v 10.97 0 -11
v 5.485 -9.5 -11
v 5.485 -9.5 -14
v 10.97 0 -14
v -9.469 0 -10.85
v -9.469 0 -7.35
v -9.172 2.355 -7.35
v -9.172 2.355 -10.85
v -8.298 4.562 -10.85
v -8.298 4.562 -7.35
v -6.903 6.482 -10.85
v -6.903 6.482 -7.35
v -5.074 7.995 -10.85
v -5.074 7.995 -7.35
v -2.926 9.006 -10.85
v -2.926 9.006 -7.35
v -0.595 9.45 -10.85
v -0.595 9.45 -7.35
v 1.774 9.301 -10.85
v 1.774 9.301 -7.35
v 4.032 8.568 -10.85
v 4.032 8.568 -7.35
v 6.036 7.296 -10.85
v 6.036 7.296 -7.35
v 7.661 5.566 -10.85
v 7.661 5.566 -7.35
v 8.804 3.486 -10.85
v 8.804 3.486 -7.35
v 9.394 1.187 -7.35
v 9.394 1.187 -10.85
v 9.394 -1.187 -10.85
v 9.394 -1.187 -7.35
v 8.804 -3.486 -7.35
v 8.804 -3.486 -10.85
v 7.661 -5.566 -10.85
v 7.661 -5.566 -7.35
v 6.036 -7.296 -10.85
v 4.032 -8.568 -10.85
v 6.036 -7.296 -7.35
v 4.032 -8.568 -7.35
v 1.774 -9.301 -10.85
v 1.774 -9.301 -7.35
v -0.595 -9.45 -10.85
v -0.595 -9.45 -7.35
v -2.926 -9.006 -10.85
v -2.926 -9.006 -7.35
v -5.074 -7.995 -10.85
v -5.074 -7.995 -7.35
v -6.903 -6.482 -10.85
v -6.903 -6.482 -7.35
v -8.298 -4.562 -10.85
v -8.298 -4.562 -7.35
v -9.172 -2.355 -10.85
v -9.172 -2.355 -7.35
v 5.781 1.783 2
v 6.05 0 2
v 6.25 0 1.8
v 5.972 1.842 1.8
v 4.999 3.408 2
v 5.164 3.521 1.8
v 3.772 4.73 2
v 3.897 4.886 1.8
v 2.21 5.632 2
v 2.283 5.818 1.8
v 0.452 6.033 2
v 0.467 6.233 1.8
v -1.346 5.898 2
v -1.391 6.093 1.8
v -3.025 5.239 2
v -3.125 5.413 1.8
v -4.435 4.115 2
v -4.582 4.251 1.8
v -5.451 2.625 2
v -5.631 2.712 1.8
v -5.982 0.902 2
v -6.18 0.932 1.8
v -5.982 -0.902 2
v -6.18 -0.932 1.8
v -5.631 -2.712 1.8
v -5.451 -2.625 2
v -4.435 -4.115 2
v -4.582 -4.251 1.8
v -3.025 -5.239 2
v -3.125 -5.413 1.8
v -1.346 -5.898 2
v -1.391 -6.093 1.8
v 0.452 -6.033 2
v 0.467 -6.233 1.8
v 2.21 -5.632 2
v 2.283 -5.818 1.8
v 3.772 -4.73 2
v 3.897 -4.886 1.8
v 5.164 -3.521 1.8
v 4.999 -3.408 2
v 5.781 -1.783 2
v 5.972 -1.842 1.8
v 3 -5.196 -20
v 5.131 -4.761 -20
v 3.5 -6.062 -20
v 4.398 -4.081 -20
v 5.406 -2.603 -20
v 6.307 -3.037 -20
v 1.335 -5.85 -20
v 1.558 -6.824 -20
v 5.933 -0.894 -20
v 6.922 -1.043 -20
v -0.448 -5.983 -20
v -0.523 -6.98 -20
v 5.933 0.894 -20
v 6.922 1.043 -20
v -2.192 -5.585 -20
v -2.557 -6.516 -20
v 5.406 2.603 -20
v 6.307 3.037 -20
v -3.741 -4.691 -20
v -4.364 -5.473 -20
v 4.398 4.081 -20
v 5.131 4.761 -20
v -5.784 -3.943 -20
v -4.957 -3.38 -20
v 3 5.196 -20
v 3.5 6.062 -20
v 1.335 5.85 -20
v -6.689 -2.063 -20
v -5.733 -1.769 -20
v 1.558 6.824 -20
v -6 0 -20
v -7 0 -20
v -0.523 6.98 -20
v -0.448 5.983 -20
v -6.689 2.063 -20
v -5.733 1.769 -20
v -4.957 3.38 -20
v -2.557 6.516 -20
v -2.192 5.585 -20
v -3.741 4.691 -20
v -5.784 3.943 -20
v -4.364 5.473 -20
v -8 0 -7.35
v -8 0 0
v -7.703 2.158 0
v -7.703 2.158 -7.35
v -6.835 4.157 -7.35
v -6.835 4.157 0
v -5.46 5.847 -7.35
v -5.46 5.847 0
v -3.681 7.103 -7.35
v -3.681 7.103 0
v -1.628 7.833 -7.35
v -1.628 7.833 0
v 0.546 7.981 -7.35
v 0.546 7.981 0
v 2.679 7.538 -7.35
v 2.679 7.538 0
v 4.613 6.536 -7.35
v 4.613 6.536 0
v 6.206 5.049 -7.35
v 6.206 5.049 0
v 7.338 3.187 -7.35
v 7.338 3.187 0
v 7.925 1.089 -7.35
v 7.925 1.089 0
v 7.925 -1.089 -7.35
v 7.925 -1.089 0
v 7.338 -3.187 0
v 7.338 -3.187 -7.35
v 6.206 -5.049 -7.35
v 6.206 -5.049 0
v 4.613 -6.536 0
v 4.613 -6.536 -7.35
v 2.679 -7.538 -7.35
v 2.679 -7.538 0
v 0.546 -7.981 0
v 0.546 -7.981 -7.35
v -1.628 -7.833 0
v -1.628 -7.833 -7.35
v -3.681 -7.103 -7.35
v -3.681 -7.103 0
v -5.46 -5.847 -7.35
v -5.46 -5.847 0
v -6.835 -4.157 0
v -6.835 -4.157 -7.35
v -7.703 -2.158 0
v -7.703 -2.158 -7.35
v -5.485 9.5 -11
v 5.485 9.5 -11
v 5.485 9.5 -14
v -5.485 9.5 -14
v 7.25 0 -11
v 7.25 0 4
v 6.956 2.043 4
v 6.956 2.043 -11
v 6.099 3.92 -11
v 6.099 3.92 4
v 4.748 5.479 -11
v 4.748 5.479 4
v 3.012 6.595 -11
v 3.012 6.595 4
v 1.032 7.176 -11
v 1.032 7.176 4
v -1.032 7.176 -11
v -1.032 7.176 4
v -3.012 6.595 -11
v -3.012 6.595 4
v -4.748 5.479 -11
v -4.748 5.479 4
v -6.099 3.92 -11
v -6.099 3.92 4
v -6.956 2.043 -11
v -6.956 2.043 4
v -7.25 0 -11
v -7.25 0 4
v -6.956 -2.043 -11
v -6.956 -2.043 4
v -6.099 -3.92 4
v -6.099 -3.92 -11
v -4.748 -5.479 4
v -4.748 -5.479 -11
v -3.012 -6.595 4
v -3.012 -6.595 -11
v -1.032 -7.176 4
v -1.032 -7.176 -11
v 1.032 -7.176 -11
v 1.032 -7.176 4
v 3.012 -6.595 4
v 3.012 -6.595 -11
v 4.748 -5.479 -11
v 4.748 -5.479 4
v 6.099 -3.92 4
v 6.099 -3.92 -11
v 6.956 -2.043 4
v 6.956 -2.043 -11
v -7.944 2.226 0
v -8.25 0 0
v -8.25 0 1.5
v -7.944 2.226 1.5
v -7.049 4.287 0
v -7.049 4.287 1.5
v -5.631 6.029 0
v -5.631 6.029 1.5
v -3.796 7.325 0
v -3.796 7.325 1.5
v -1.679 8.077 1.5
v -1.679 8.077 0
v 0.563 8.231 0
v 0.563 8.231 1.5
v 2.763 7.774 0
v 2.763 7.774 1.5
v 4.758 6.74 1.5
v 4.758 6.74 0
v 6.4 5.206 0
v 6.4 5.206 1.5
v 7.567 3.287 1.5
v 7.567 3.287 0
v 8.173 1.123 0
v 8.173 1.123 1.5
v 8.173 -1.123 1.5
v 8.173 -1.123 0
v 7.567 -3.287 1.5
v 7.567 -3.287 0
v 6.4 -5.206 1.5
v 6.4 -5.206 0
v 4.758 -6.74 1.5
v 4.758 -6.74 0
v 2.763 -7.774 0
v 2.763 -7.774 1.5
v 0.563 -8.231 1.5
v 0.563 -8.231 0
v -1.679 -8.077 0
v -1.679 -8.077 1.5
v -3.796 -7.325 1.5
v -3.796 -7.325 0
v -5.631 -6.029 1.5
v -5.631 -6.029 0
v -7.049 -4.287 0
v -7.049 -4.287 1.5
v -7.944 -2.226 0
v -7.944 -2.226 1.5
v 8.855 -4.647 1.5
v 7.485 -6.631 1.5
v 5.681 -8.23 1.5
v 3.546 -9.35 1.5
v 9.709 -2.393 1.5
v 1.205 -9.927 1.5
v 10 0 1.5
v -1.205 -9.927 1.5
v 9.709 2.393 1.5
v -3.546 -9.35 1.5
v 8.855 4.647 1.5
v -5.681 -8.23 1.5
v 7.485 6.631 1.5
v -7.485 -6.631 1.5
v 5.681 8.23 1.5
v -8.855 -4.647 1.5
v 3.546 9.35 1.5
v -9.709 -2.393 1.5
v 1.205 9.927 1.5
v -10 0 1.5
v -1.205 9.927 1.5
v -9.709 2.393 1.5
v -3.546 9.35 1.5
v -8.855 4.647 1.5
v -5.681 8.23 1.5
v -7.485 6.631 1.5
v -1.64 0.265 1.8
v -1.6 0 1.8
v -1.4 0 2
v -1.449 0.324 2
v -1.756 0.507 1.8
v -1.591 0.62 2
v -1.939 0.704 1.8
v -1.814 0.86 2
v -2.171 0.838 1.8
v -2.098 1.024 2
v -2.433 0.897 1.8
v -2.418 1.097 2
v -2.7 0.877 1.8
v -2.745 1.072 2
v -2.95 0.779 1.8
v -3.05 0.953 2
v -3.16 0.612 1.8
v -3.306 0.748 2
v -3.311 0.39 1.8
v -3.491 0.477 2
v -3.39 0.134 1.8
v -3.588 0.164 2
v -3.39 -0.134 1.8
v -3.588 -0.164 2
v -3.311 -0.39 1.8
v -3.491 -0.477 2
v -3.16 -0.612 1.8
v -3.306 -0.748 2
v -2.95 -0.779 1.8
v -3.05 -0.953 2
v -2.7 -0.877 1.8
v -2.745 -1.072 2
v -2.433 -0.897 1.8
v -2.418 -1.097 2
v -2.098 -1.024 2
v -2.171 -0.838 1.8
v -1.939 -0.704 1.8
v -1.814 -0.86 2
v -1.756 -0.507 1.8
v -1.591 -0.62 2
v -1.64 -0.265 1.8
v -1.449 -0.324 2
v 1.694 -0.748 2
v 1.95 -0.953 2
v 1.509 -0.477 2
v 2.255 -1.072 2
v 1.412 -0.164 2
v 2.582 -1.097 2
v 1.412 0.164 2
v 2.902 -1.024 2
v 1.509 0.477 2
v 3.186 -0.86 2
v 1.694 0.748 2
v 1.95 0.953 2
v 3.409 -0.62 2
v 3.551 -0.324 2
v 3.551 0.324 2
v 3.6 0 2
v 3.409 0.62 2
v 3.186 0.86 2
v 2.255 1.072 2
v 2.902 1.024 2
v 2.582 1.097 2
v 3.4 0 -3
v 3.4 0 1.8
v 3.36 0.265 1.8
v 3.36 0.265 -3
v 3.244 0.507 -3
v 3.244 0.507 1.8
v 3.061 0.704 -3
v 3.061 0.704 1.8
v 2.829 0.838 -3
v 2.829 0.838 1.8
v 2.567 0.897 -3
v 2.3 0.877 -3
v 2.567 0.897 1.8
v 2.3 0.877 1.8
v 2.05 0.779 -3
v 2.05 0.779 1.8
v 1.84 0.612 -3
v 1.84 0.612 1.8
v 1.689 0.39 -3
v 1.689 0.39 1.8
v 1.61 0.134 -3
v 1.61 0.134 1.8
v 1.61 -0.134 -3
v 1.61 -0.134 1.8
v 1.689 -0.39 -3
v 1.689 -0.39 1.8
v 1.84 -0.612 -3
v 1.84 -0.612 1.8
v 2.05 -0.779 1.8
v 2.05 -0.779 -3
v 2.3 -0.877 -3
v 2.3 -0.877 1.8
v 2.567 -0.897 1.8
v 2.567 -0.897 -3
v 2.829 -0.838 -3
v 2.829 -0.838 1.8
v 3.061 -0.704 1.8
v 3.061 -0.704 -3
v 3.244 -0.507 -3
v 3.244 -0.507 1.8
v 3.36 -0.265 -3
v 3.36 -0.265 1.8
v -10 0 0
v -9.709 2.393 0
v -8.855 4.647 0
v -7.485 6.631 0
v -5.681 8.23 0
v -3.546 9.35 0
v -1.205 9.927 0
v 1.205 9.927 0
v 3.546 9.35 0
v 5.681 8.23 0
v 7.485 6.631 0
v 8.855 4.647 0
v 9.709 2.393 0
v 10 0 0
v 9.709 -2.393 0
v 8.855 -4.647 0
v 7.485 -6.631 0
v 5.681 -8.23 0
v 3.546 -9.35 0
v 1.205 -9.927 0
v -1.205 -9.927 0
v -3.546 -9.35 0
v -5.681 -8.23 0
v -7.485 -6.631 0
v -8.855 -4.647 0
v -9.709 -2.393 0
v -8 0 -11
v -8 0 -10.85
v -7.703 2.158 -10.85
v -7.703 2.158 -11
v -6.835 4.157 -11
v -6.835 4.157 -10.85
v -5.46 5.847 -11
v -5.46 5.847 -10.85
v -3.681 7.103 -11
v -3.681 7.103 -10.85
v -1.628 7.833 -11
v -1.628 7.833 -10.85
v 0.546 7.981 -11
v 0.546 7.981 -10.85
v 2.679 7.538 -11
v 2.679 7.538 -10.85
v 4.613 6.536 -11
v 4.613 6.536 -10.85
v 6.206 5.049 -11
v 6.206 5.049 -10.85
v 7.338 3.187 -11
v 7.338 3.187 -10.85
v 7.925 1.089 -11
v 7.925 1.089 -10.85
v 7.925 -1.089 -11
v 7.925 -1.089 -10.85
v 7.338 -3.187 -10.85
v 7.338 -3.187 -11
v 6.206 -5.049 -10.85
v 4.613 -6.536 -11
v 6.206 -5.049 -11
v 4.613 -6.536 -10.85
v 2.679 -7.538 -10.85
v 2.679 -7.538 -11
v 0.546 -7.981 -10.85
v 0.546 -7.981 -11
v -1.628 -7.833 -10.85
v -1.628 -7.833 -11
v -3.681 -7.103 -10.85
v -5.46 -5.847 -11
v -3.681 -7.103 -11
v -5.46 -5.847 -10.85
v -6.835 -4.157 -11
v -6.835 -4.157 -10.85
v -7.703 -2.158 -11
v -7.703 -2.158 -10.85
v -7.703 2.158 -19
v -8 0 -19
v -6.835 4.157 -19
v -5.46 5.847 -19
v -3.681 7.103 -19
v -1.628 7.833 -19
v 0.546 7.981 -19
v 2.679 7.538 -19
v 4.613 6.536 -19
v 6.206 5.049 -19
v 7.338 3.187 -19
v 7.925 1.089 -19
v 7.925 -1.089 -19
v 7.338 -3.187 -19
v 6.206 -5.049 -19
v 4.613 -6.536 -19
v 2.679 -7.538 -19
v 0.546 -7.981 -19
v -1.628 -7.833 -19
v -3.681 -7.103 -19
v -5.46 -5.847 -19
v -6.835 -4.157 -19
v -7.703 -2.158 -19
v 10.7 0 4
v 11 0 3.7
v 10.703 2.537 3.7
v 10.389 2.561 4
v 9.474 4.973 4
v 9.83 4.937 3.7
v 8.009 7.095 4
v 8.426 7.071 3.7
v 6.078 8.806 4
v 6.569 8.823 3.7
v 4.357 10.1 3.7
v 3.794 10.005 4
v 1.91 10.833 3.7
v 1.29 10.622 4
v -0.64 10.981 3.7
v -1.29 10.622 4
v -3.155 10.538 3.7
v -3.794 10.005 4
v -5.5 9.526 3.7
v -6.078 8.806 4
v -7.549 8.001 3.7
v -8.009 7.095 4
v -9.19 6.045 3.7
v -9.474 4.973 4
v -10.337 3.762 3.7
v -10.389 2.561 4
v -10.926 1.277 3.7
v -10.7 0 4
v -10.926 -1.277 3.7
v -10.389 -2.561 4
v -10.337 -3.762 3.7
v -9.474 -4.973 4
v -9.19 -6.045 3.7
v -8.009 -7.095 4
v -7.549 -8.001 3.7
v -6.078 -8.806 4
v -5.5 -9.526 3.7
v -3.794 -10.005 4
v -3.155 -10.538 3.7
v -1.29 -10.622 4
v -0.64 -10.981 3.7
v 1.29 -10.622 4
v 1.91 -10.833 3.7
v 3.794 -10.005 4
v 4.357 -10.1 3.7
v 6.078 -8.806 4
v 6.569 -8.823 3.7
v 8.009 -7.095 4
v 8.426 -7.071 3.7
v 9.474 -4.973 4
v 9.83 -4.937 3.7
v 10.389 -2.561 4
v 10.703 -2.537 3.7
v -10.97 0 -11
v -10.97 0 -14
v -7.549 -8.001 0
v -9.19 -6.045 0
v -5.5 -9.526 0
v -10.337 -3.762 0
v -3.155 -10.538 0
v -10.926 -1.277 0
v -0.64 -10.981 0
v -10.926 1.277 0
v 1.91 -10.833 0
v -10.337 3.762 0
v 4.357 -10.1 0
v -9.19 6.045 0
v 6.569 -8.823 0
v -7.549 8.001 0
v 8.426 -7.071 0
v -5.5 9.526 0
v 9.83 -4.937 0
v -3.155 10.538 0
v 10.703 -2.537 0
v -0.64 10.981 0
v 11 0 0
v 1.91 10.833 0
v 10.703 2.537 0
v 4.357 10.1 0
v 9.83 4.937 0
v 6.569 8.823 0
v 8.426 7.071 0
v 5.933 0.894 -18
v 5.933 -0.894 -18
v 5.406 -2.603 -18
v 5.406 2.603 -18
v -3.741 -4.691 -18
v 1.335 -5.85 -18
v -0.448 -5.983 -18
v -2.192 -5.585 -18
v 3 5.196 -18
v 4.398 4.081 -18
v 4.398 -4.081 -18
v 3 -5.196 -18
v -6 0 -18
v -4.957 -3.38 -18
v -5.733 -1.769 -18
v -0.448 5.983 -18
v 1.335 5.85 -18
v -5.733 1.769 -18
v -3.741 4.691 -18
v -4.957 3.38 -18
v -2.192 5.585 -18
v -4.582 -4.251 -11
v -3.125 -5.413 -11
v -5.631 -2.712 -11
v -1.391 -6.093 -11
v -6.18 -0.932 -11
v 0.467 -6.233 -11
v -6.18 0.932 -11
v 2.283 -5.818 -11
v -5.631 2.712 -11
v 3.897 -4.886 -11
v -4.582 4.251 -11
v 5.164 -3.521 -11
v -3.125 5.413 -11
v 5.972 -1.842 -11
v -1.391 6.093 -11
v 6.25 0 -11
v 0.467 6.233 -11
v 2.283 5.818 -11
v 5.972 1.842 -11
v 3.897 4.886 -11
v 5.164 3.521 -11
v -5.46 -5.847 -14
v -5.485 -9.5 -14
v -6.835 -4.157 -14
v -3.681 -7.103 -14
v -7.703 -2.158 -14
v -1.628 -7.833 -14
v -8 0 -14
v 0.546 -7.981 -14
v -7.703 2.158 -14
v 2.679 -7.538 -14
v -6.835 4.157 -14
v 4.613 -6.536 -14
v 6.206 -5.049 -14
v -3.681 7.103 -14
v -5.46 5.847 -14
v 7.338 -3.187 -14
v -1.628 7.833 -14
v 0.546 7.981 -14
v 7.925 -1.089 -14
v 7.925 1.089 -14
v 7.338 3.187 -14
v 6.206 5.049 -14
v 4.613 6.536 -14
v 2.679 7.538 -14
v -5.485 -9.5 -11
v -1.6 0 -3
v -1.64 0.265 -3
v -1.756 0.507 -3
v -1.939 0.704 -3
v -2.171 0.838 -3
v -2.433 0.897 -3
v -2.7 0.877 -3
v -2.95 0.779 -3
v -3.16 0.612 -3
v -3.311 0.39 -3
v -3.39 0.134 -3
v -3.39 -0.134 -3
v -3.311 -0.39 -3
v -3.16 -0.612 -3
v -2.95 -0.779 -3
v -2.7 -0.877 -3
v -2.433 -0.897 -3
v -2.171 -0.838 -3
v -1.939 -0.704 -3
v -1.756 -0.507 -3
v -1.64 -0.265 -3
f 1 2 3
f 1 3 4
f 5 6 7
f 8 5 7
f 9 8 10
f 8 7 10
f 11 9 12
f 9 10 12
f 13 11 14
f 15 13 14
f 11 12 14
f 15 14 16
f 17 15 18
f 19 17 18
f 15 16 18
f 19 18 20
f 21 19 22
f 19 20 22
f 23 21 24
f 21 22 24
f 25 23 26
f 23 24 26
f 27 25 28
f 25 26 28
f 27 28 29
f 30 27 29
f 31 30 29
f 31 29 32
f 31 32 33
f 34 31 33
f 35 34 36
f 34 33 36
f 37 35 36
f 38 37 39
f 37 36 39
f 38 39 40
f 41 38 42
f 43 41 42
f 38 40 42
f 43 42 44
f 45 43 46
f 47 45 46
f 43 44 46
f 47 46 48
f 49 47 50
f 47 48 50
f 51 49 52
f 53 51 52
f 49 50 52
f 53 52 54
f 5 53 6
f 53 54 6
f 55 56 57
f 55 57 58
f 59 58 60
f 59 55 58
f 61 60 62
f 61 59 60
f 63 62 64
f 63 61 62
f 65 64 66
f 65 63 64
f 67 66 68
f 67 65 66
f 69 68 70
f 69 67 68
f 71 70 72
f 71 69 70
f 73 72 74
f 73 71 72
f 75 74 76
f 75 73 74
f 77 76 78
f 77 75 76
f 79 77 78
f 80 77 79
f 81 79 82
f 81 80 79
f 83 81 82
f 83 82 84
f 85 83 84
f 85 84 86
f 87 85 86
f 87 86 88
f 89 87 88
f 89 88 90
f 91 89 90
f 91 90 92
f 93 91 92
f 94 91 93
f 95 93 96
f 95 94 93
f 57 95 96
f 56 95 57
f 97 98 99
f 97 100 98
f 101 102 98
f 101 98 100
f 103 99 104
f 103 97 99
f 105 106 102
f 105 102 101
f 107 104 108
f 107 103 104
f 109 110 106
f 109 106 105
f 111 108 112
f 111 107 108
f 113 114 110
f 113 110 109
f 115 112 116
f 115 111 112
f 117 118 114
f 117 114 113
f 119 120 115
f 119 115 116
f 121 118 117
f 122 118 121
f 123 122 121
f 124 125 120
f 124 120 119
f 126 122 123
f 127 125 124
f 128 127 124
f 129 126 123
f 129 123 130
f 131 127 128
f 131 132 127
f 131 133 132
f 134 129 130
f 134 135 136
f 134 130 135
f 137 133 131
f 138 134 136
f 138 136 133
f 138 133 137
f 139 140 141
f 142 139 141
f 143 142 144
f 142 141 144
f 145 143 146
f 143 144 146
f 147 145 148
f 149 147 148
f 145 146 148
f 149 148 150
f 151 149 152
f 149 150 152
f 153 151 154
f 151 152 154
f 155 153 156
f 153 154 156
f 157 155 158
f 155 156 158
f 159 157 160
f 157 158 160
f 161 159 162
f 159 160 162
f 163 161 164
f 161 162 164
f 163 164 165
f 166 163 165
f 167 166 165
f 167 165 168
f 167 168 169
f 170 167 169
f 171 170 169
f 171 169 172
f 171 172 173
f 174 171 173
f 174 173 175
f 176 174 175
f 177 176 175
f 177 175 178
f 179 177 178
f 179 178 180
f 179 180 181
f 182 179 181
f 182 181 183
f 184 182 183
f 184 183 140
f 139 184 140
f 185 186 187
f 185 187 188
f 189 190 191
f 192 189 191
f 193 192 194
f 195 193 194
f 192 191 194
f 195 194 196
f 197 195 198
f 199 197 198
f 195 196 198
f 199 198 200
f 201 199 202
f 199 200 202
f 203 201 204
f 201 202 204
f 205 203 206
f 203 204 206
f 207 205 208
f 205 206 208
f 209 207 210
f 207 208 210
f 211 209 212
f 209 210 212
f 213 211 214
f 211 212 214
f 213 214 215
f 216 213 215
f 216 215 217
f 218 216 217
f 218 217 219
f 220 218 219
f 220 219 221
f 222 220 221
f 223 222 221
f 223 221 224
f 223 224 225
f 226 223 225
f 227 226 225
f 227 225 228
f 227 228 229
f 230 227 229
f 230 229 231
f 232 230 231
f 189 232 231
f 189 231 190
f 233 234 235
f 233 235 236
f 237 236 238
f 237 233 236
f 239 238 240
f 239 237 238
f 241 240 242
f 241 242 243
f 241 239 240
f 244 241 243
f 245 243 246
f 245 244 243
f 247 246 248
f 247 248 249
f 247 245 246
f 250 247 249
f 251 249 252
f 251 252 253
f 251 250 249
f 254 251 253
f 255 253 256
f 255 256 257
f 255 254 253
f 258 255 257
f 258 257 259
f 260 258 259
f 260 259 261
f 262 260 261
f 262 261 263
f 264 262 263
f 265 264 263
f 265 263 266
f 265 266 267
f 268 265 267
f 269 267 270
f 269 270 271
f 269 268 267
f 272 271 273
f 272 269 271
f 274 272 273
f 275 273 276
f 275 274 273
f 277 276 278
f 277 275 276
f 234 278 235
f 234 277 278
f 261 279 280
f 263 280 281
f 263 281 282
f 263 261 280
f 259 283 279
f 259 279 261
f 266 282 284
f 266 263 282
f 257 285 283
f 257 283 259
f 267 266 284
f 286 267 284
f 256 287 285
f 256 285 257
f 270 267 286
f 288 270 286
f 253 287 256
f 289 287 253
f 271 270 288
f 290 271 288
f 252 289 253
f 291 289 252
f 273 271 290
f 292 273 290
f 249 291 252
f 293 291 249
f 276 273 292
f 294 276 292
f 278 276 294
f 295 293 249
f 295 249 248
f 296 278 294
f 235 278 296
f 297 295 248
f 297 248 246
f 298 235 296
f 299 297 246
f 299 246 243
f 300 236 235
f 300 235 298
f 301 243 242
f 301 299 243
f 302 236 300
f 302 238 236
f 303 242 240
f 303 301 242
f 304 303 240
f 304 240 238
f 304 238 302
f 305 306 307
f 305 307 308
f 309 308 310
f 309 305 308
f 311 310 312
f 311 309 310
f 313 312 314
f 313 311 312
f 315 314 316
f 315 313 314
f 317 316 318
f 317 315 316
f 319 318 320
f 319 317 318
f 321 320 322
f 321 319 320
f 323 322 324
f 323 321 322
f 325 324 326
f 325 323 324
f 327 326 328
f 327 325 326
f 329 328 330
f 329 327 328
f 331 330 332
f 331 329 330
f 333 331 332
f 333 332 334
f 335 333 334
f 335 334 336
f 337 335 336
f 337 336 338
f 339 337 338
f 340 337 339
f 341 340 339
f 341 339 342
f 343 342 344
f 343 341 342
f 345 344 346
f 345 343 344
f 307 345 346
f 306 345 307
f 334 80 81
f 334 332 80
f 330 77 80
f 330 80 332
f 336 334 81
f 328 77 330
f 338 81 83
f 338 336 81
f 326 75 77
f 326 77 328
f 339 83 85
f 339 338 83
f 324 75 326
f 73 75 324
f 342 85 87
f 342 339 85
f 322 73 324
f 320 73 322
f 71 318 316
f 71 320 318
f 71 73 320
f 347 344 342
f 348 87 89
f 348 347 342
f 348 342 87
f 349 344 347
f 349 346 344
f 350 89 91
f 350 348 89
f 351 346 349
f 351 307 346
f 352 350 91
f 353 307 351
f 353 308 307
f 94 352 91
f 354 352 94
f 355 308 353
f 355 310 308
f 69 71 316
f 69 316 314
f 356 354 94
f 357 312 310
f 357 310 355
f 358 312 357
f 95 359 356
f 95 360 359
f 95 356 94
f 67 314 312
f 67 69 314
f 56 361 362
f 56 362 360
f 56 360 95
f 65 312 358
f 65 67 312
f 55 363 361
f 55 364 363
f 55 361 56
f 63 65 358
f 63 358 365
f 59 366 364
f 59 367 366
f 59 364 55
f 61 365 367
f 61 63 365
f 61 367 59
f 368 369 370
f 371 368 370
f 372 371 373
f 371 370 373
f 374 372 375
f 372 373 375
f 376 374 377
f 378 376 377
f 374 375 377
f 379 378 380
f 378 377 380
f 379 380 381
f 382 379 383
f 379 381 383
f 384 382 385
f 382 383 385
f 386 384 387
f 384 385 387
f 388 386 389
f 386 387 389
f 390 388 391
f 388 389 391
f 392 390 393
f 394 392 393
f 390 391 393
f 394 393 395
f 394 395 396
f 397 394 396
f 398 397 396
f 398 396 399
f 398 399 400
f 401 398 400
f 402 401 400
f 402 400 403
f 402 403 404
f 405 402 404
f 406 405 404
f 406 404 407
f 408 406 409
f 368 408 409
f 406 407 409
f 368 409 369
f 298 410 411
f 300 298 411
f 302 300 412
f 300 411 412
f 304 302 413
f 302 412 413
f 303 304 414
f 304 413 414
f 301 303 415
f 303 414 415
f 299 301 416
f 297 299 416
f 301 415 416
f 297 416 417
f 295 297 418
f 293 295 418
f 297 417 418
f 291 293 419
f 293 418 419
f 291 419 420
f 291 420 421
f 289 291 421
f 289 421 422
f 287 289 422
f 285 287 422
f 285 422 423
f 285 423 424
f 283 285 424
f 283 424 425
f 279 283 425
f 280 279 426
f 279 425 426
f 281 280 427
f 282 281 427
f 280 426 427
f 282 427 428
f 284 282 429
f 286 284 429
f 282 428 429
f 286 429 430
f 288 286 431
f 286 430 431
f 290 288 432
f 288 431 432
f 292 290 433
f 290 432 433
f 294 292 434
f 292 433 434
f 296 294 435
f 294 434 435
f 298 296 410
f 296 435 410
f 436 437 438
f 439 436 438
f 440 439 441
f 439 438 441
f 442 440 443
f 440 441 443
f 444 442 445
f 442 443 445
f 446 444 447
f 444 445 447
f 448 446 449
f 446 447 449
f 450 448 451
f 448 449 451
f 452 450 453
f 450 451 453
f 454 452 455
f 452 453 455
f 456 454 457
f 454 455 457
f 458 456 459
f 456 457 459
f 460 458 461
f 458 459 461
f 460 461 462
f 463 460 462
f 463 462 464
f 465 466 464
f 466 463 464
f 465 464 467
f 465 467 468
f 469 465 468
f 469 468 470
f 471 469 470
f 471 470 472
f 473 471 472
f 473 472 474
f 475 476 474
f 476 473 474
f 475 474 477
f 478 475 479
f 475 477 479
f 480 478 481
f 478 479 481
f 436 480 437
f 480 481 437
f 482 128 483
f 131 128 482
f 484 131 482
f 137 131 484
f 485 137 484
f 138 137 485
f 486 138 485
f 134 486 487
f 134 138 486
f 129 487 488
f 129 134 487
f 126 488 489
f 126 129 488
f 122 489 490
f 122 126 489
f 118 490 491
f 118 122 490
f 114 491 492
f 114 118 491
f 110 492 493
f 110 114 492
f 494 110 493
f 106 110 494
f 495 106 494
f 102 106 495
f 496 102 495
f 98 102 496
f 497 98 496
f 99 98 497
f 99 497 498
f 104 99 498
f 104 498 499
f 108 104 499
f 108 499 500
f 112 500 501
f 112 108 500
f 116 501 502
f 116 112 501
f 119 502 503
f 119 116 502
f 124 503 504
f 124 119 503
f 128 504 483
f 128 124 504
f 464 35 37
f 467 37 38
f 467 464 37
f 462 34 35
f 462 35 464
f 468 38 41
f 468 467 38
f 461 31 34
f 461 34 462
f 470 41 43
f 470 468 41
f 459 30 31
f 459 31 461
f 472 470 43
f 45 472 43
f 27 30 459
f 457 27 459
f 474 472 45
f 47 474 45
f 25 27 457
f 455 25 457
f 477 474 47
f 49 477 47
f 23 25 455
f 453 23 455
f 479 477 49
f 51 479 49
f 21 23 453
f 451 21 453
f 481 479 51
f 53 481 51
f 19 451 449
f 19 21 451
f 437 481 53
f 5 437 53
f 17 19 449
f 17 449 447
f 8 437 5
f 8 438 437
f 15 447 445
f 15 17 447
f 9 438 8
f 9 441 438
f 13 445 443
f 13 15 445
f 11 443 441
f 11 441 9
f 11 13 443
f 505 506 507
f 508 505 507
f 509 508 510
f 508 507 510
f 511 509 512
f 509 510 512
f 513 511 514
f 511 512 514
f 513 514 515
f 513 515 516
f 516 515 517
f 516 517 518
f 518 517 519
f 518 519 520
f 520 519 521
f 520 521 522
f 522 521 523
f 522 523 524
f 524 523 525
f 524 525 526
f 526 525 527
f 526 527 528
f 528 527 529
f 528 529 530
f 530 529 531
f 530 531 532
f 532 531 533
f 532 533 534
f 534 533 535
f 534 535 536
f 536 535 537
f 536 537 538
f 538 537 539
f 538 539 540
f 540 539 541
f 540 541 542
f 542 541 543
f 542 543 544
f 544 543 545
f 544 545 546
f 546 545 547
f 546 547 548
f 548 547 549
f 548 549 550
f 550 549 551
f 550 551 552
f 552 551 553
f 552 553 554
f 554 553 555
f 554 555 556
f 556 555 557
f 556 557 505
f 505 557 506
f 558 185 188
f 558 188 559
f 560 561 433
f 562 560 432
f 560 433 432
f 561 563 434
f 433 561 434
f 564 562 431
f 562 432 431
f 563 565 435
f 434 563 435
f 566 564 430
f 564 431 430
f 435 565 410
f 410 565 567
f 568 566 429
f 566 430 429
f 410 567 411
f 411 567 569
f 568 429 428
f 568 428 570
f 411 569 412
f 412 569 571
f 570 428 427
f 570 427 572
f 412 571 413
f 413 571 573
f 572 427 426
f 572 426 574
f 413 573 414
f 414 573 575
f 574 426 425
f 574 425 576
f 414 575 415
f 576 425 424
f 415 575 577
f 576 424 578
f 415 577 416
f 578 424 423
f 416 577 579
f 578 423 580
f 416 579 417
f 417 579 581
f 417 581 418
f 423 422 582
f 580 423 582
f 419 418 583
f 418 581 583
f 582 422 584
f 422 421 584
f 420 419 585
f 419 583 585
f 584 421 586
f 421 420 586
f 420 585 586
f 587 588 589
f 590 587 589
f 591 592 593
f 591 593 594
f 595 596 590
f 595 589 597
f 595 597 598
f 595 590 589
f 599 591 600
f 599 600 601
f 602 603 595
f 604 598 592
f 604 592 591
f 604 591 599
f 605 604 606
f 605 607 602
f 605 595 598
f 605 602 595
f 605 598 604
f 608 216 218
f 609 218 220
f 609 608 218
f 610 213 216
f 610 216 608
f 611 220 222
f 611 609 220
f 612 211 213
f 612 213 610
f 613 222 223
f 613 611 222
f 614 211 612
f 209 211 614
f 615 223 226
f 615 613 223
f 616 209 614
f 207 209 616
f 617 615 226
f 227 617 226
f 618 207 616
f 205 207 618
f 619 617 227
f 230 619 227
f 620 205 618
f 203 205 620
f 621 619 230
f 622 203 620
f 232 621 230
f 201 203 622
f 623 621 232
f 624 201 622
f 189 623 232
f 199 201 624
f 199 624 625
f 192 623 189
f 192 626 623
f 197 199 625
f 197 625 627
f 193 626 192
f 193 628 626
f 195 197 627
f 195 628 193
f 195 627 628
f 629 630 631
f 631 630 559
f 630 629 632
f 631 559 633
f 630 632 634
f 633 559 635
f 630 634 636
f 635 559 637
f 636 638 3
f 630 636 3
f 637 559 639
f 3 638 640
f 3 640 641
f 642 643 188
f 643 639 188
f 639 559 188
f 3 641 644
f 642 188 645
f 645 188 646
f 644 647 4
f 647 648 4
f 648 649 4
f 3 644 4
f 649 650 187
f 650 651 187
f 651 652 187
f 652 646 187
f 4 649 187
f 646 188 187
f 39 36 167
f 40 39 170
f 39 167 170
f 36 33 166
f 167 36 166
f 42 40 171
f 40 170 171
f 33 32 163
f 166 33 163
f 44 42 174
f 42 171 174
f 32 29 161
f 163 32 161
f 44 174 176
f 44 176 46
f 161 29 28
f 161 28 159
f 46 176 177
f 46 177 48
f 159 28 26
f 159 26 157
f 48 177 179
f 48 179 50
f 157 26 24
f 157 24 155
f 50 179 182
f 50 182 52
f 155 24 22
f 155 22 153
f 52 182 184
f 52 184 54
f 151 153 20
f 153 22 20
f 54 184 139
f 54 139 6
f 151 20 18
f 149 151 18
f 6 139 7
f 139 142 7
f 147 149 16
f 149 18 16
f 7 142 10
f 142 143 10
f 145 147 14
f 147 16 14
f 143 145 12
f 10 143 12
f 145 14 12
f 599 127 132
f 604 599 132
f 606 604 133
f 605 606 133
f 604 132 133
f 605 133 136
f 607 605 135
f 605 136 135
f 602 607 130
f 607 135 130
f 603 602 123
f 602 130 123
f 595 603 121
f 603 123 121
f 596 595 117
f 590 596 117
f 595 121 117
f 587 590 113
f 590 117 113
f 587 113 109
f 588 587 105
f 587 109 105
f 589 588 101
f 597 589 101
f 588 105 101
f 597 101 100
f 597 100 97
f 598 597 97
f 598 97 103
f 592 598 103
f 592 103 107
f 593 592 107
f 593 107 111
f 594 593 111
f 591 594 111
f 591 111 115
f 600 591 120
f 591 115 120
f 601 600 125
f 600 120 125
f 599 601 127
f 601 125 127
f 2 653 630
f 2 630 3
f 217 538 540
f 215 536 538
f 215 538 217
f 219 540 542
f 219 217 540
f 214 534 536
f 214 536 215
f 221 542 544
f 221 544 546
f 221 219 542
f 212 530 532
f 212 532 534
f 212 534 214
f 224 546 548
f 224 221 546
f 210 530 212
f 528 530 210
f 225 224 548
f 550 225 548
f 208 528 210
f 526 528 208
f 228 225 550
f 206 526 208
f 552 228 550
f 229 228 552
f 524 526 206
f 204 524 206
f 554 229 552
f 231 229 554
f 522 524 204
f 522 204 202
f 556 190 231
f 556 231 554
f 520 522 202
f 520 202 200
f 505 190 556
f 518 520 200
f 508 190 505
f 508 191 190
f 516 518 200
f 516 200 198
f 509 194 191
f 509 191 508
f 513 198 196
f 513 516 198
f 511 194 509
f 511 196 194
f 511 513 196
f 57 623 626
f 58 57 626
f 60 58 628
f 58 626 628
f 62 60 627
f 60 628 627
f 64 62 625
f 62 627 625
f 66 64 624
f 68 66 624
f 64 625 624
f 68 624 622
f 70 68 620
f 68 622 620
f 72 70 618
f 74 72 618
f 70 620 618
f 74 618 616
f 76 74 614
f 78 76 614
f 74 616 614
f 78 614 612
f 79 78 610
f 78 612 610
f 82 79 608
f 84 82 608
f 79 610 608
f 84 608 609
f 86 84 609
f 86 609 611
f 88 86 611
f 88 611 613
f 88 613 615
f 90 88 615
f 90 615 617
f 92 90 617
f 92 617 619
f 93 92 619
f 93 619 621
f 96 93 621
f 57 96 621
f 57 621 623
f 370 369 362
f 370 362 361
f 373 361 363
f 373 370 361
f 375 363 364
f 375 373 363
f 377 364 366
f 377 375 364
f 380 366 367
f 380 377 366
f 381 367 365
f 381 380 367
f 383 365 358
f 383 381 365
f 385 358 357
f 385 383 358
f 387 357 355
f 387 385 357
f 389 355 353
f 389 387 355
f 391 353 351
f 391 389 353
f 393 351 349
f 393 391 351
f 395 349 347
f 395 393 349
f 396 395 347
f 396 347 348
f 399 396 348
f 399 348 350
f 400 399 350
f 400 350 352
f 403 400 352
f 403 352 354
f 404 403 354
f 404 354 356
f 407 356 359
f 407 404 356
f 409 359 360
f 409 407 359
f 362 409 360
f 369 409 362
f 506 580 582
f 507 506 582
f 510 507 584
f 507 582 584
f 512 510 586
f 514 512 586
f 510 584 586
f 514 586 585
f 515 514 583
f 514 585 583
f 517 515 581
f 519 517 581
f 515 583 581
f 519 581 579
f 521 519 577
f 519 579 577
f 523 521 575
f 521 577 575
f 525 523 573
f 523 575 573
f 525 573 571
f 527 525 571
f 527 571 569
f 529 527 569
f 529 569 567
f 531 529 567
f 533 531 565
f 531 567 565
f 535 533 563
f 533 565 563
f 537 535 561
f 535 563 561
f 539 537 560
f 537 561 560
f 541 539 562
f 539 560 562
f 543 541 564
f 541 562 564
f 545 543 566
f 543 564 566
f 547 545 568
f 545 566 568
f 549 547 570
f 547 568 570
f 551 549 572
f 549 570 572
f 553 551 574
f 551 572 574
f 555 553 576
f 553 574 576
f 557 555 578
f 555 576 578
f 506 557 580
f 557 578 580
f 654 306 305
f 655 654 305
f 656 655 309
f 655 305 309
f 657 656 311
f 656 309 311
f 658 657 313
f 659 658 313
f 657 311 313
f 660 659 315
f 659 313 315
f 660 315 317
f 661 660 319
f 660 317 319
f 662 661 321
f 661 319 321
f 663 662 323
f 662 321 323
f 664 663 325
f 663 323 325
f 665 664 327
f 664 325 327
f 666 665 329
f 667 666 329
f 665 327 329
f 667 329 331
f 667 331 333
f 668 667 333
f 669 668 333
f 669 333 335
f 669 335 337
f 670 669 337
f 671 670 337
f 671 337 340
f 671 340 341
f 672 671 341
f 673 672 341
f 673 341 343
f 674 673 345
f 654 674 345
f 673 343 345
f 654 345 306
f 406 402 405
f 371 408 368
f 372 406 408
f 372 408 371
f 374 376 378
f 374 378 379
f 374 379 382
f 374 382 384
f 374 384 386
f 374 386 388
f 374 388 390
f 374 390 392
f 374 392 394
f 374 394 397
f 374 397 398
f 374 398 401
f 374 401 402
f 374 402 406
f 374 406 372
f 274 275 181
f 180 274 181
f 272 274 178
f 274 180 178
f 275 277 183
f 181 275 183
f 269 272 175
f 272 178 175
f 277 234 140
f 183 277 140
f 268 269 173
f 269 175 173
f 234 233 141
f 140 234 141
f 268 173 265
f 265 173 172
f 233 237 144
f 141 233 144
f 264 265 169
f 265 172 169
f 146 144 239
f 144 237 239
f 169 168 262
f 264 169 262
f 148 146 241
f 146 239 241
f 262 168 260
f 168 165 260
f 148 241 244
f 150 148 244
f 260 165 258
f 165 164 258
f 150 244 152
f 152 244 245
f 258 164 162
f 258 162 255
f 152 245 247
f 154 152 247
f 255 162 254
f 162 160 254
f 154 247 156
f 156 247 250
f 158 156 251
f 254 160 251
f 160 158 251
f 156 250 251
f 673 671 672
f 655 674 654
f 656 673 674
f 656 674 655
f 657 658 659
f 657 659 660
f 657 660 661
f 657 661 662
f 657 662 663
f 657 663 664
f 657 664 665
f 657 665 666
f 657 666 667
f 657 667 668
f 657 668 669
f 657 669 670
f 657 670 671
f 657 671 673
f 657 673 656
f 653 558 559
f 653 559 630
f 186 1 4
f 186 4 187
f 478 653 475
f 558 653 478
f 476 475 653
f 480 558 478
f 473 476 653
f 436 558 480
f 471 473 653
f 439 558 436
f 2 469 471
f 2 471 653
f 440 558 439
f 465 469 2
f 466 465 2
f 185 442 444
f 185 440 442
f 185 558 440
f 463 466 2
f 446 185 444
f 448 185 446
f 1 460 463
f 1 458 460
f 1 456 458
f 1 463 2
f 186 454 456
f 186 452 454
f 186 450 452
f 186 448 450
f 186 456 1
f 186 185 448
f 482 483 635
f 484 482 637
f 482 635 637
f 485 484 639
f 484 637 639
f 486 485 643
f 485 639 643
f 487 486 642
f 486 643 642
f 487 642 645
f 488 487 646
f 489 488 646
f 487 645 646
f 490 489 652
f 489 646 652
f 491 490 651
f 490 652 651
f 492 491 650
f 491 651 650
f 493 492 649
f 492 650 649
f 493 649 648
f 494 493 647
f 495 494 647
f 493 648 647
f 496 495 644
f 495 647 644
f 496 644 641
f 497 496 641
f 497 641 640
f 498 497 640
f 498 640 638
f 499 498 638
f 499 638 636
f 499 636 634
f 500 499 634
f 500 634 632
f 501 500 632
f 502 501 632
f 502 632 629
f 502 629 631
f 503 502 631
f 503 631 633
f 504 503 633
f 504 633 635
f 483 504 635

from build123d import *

# Parameters (mm, degrees)
SKETCH1_R          = 11
EXTRUDE1_DEPTH     = 4
SKETCH3_R          = 8
EXTRUDE3_DEPTH     = 20
SKETCH7_R          = 7.25
CUT_EXTRUDE5_DEPTH = 16
SKETCH4_R          = 6.25
EXTRUDE4_DEPTH     = 14
CHAMFER1_SIZE      = 0.2
CHAMFER3_SIZE      = 0.3
SKETCH5_R          = 10
SKETCH5_R_2        = 8.25
CUT_EXTRUDE1_DEPTH = 1.5
SKETCH6_R          = 0.9
CUT_EXTRUDE2_DEPTH = 5
CHAMFER4_SIZE      = 0.2
SKETCH8_R          = 6
CUT_EXTRUDE6_DEPTH = 2
CHAMFER5_SIZE      = 1
EXTRUDE6_START     = 7.35
SKETCH10_R         = 9.469128054
SKETCH10_R_2       = 8
EXTRUDE6_DEPTH     = 3.5
EXTRUDE5_START     = -7
EXTRUDE5_DEPTH     = 3


with BuildPart() as part:
    # Sketch1 → Extrude1 (new body)
    with BuildSketch(Plane.XY):
        Circle(SKETCH1_R)
    extrude(amount=EXTRUDE1_DEPTH)

    # Sketch3 → Extrude3 (add)
    with BuildSketch(Plane(origin=(0, 0, 0), x_dir=(-1, 0, 0), z_dir=(0, 0, -1))):
        Circle(SKETCH3_R)
    extrude(amount=EXTRUDE3_DEPTH)

    # Sketch7 → Cut-Extrude5 (cut)
    with BuildSketch(Plane.XY.offset(4)):
        Circle(SKETCH7_R)
    extrude(amount=-CUT_EXTRUDE5_DEPTH, mode=Mode.SUBTRACT)

    # Sketch4 → Extrude4 (add)
    with BuildSketch(Plane.XY.offset(-12)):
        Circle(SKETCH4_R)
    extrude(amount=EXTRUDE4_DEPTH)

    # Chamfer1
    chamfer1_edges = [part.edges().sort_by_distance(p)[0] for p in [
        (-6.25, 0, 2),
    ]]
    chamfer(chamfer1_edges, length=CHAMFER1_SIZE)

    # Chamfer3
    chamfer3_edges = [part.edges().sort_by_distance(p)[0] for p in [
        (-11, 0, 4),
    ]]
    chamfer(chamfer3_edges, length=CHAMFER3_SIZE)

    # Sketch5 → Cut-Extrude1 (cut)
    with BuildSketch(Plane(origin=(0, 0, 0), x_dir=(-1, 0, 0), z_dir=(0, 0, -1))):
        Circle(SKETCH5_R)
        Circle(SKETCH5_R_2, mode=Mode.SUBTRACT)
    extrude(amount=-CUT_EXTRUDE1_DEPTH, mode=Mode.SUBTRACT)

    # Sketch6 → Cut-Extrude2 (cut)
    with BuildSketch(Plane.XY.offset(2)):
        with Locations((2.5, 0)):
            Circle(SKETCH6_R)
        with Locations((-2.5, 0)):
            Circle(SKETCH6_R)
    extrude(amount=-CUT_EXTRUDE2_DEPTH, mode=Mode.SUBTRACT)

    # Chamfer4
    chamfer4_edges = [part.edges().sort_by_distance(p)[0] for p in [
        (1.6, 0, 2),
        (-3.4, 0, 2),
    ]]
    chamfer(chamfer4_edges, length=CHAMFER4_SIZE)

    # Sketch8 → Cut-Extrude6 (cut)
    with BuildSketch(Plane(origin=(0, 0, -20), x_dir=(-1, 0, 0), z_dir=(0, 0, -1))):
        Circle(SKETCH8_R)
    extrude(amount=-CUT_EXTRUDE6_DEPTH, mode=Mode.SUBTRACT)

    # Chamfer5
    chamfer5_edges = [part.edges().sort_by_distance(p)[0] for p in [
        (8, 0, -20),
    ]]
    chamfer(chamfer5_edges, length=CHAMFER5_SIZE)

    # Sketch10 → Extrude6 (add)
    with BuildSketch(Plane(origin=(0, 0, 0), x_dir=(-1, 0, 0), z_dir=(0, 0, -1)).offset(EXTRUDE6_START)):
        Circle(SKETCH10_R)
        Circle(SKETCH10_R_2, mode=Mode.SUBTRACT)
    extrude(amount=EXTRUDE6_DEPTH)

    # Sketch9 → Extrude5 (add)
    with BuildSketch(Plane(origin=(0, 0, -18), x_dir=(-1, 0, 0), z_dir=(0, 0, -1)).offset(EXTRUDE5_START)):
        Polygon((-5.484827557, 9.5), (5.484827557, 9.5), (10.969655115, 0), (5.484827557, -9.5), (-5.484827557, -9.5), (-10.969655115, 0), align=None)
    extrude(amount=EXTRUDE5_DEPTH)


solid = part.part
